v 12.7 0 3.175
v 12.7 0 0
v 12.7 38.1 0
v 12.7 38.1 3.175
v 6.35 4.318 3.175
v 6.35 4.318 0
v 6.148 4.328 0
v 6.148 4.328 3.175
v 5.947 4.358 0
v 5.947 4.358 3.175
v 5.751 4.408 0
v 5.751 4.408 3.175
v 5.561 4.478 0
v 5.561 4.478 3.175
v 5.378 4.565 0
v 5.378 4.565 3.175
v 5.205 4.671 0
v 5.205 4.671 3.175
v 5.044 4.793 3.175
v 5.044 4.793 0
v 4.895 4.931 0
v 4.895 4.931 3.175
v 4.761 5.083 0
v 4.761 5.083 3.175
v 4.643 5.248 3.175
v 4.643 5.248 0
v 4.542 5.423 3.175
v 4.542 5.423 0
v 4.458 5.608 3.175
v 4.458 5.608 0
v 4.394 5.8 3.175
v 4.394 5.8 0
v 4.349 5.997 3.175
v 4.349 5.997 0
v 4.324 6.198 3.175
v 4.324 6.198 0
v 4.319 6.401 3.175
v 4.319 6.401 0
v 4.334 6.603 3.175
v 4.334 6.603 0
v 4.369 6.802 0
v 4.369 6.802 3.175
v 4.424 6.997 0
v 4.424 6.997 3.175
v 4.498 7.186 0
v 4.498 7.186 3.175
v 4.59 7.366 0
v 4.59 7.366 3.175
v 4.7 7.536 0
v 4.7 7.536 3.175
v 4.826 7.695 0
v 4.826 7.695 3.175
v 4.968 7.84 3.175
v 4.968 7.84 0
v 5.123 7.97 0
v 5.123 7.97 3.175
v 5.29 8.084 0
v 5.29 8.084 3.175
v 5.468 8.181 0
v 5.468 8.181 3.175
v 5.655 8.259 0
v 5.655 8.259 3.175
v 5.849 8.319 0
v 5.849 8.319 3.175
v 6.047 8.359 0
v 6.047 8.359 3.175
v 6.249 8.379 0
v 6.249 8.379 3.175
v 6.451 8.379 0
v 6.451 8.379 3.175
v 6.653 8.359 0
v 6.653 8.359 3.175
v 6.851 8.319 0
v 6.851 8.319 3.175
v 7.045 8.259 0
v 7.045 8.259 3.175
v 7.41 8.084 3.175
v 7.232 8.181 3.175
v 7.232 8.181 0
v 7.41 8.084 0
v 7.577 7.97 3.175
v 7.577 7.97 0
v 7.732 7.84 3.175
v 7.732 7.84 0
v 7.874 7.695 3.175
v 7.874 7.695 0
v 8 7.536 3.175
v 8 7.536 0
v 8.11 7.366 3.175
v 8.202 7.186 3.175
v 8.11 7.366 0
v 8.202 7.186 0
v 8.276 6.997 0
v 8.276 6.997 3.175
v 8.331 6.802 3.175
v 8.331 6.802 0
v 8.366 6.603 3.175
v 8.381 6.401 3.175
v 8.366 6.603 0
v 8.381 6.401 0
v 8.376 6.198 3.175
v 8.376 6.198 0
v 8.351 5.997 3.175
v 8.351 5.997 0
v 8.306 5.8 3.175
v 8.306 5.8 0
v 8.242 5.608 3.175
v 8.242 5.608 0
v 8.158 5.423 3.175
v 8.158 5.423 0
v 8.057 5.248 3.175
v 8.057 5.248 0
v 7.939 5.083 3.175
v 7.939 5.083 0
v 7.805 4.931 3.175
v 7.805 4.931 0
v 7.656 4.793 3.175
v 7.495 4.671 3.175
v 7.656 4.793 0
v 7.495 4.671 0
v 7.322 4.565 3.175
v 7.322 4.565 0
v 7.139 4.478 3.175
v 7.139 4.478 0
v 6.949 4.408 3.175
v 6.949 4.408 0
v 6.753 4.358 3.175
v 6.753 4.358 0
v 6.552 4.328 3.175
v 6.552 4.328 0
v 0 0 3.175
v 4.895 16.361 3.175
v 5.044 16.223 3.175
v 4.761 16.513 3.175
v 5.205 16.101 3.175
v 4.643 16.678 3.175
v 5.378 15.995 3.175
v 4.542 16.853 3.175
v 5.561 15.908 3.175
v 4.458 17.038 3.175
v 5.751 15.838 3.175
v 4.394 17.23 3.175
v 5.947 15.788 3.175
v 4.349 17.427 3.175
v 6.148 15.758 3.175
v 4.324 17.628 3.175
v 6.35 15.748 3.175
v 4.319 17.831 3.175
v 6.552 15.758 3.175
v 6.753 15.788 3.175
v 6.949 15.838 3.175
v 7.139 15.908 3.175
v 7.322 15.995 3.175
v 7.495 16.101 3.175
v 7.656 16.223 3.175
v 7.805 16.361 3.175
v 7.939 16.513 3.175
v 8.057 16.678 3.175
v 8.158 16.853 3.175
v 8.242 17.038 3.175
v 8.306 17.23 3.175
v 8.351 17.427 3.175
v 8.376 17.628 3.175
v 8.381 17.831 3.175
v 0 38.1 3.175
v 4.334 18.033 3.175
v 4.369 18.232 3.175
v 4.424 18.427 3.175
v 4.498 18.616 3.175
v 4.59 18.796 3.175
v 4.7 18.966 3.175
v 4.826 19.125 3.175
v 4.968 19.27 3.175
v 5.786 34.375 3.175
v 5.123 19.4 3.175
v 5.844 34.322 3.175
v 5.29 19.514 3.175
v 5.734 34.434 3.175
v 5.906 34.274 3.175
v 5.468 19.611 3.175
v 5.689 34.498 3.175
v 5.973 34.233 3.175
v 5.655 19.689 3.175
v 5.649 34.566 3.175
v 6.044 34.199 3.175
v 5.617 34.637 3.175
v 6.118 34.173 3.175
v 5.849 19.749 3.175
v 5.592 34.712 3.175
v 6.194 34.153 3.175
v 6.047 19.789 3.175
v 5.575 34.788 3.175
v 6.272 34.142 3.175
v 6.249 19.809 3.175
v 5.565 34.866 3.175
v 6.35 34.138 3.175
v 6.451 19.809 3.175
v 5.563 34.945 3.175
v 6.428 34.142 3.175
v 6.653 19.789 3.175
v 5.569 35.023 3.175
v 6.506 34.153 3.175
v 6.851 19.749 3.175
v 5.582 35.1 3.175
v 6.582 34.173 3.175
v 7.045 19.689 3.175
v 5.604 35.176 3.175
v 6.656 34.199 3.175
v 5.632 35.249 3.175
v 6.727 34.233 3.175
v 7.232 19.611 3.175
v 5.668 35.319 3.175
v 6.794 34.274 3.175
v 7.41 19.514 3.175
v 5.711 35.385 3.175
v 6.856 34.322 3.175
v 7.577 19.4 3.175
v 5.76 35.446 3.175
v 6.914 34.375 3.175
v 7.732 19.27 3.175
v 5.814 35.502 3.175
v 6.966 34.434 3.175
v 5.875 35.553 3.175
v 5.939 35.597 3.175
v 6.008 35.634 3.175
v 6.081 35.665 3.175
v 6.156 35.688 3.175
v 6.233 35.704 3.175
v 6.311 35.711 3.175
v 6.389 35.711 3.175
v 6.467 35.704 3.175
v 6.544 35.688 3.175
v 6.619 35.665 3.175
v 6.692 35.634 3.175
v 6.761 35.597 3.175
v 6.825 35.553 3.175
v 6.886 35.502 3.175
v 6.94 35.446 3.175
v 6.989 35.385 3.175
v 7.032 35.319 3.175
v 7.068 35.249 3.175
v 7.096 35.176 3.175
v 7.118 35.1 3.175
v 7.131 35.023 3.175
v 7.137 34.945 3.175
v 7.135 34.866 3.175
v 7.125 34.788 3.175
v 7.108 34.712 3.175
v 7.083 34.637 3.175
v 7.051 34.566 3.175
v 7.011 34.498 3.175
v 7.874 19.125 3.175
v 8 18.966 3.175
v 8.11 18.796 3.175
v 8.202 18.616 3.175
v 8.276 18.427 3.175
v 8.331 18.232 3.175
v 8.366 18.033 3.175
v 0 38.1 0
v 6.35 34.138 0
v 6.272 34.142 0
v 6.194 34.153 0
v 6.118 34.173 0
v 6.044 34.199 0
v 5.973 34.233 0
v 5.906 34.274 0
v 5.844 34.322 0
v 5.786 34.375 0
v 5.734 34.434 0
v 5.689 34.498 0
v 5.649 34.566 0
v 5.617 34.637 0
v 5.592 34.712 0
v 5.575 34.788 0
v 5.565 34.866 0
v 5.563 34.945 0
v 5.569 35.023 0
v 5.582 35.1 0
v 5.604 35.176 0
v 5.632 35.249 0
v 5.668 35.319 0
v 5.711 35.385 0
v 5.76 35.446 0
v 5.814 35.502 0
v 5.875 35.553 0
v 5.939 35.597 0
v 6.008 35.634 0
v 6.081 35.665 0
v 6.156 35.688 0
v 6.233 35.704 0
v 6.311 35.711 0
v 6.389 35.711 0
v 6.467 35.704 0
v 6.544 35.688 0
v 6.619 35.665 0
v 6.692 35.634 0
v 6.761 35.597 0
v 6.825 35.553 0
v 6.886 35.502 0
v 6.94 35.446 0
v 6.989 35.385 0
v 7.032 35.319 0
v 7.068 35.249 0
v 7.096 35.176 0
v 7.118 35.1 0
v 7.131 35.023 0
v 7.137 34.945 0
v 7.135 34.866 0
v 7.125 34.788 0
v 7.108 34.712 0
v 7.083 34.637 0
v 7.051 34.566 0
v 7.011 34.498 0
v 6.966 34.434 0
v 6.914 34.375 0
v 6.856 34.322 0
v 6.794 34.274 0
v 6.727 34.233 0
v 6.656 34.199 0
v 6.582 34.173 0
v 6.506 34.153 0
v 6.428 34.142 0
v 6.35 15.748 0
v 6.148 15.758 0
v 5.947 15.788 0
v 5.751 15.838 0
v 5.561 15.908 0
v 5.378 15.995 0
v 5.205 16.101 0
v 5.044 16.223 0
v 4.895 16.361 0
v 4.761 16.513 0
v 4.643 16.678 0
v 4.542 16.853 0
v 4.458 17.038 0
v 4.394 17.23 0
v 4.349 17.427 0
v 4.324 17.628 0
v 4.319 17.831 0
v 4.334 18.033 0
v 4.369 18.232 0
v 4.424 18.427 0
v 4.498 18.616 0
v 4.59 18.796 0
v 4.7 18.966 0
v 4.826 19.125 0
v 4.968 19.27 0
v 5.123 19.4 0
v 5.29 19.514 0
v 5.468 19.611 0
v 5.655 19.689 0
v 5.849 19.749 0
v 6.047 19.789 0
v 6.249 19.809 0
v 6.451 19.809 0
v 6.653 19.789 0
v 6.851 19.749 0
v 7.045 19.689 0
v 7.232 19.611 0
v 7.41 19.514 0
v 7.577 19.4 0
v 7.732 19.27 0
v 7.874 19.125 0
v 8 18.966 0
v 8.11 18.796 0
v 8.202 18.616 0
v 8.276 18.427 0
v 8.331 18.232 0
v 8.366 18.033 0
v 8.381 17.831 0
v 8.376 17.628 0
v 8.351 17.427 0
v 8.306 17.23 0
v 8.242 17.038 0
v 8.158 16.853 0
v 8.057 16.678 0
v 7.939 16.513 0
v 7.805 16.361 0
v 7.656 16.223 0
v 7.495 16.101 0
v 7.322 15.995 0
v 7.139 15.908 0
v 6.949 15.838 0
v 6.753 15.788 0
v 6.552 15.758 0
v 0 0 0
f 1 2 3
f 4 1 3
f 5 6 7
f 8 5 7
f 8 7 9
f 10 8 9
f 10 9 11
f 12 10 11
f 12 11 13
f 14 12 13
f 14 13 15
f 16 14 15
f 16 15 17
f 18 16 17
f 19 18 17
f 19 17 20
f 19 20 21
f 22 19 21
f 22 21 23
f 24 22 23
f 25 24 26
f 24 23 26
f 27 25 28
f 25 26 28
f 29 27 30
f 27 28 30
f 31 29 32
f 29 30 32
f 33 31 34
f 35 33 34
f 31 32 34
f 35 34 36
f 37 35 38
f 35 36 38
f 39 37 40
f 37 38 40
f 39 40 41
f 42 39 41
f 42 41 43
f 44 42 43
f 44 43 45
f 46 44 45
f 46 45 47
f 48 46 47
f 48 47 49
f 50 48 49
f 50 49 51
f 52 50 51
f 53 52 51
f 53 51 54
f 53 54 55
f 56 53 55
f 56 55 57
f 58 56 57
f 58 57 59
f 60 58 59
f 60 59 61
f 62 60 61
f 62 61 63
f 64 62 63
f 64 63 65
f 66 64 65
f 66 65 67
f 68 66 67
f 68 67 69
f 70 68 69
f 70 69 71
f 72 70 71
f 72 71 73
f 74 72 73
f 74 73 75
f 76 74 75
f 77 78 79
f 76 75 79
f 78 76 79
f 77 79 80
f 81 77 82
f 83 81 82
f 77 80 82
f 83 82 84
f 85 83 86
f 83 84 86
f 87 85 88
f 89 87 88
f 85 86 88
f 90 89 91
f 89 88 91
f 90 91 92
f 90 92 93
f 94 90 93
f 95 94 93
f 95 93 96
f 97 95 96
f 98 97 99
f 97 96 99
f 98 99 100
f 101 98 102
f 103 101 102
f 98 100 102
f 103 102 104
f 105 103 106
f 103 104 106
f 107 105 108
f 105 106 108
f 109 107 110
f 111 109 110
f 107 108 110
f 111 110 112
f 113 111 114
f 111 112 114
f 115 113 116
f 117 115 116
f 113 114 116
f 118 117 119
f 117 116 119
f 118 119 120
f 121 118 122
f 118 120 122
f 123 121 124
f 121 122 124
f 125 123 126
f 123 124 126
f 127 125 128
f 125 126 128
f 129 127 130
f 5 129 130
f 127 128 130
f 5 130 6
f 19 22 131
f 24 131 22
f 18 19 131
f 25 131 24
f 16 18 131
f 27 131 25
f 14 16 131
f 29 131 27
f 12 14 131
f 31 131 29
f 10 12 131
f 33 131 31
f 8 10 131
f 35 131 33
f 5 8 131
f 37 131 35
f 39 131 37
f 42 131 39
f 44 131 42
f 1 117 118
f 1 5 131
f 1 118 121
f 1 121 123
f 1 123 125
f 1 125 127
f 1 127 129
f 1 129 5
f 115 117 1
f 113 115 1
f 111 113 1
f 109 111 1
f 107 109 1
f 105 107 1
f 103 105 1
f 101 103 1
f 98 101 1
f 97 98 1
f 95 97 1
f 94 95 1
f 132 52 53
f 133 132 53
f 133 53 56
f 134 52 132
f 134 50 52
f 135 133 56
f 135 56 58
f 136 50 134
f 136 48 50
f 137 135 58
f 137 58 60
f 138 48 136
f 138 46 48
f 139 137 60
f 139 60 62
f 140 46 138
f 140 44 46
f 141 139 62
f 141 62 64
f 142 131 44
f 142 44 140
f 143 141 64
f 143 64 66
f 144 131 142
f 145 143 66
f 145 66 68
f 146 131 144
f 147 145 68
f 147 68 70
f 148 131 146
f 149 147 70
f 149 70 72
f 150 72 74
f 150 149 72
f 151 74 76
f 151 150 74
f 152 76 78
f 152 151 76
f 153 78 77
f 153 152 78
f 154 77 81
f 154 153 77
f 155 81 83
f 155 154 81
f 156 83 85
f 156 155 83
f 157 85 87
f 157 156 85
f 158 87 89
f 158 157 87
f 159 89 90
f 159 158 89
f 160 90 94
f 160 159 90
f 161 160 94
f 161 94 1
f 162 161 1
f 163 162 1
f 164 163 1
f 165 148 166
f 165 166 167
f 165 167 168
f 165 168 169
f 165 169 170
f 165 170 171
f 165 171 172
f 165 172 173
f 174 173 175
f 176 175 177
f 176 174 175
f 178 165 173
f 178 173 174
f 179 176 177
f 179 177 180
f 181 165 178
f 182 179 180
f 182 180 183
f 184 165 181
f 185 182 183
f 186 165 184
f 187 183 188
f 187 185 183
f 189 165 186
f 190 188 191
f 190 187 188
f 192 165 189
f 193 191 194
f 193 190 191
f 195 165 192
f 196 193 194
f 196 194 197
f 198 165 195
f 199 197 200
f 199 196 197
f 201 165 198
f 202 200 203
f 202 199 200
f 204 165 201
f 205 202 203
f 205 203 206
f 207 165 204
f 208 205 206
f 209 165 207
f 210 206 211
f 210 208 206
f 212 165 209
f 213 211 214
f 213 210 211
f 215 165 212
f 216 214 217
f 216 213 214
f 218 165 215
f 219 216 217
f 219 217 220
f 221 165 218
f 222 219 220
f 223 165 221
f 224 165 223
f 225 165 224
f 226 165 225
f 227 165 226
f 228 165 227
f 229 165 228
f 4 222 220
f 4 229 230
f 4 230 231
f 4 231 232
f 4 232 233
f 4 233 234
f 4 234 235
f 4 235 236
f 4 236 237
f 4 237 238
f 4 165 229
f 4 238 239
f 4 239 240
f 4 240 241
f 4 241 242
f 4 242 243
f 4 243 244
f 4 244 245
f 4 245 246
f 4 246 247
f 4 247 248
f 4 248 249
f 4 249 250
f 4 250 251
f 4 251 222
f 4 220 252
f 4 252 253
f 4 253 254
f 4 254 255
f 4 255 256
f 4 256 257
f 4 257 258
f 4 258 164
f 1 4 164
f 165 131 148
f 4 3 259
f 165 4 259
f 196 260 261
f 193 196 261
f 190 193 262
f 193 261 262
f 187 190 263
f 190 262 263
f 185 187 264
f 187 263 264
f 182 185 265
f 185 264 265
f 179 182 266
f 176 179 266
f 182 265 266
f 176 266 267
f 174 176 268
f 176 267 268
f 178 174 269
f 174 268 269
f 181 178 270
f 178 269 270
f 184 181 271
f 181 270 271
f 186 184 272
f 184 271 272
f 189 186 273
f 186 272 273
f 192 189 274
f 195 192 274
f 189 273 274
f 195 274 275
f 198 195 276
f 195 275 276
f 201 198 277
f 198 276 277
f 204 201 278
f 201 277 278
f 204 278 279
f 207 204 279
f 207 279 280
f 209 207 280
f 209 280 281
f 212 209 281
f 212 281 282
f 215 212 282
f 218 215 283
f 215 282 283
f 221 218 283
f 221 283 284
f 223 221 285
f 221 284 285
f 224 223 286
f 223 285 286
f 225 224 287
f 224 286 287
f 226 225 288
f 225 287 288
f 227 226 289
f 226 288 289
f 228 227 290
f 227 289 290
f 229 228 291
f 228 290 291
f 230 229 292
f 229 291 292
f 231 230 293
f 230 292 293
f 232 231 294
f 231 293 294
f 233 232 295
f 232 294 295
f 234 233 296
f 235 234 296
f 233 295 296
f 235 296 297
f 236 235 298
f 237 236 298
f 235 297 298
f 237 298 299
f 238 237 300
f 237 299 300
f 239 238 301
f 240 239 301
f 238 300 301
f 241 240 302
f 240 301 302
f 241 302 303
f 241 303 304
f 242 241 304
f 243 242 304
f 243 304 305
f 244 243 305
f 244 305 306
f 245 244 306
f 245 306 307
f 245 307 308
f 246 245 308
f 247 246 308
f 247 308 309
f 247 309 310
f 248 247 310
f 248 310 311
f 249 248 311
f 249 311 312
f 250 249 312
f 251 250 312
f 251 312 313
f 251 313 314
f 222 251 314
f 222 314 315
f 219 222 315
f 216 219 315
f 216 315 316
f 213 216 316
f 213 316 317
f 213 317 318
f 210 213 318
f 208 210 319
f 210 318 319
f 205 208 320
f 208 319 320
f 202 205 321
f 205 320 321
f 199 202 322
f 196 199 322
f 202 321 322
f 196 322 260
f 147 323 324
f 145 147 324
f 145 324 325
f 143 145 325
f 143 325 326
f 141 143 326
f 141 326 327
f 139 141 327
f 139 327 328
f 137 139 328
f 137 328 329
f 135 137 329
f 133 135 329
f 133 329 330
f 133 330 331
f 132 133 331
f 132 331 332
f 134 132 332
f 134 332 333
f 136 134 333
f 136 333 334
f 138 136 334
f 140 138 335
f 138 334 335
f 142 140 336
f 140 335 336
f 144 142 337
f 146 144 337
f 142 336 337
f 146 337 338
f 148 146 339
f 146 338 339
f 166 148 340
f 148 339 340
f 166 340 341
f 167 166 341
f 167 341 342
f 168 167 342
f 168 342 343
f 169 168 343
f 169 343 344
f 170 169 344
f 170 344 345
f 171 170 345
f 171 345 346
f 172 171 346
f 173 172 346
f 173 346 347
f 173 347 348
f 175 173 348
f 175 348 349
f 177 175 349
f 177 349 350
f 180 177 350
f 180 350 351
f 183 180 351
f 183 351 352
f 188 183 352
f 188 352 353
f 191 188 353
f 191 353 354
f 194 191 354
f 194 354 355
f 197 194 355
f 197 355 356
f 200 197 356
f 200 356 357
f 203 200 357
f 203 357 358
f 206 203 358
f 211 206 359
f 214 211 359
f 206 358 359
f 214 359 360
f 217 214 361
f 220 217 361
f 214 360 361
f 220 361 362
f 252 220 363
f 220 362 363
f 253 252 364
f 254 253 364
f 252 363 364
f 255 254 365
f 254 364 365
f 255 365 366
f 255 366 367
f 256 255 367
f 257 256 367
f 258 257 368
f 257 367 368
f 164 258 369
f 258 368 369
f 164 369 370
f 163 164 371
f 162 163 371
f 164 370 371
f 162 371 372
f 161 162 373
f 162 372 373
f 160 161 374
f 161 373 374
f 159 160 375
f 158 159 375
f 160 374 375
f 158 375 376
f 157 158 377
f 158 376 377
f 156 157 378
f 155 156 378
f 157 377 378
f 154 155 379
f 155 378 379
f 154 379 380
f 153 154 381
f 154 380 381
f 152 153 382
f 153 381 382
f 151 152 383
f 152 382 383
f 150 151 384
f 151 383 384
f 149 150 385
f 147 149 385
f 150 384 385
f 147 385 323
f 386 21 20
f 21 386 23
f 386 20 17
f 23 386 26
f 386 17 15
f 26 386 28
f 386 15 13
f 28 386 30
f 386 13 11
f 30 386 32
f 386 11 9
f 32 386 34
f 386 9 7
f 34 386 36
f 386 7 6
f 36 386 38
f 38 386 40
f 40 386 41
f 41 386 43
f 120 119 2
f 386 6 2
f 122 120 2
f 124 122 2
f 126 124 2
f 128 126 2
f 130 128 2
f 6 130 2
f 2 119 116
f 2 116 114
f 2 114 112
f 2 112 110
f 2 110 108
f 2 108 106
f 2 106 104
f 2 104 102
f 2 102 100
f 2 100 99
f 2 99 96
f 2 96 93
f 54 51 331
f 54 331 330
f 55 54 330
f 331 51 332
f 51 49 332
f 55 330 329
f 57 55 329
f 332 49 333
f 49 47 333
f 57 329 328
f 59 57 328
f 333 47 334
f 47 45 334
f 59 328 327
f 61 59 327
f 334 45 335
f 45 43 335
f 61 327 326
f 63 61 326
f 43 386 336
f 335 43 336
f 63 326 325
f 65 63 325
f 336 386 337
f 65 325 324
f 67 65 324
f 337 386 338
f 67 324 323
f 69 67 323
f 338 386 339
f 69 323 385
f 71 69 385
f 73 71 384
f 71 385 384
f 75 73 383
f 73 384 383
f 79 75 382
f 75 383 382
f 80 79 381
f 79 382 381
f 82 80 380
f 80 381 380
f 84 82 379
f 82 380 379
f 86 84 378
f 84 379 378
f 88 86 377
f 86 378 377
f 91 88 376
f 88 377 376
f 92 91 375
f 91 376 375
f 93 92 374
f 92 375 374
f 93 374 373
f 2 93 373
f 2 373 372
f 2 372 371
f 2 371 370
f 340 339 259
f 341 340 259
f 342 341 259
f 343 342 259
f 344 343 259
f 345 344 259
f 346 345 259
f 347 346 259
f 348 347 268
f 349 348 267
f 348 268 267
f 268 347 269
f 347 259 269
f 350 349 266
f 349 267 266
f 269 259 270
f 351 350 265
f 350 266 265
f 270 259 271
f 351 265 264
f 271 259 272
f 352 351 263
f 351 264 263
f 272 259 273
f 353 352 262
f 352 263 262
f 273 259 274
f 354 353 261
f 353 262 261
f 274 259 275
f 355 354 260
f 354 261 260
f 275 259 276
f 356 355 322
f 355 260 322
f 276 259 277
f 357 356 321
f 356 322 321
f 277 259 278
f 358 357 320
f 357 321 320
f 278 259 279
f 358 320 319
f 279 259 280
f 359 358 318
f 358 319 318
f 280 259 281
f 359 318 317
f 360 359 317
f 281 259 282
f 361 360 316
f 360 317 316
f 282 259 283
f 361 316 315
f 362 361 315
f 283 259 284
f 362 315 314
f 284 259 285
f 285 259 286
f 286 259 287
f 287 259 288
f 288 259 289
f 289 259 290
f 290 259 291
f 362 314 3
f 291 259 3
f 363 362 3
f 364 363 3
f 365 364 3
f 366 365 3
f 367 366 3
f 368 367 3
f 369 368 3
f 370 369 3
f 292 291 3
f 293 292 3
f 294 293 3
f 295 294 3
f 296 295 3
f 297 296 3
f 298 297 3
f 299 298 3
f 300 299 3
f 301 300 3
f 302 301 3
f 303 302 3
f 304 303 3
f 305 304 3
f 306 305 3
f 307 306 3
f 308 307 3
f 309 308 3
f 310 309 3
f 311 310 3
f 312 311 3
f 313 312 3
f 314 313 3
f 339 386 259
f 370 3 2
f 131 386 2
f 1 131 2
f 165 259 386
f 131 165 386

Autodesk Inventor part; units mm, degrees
ref_plane "YZ Plane" through (0, 0, 0) normal (1, 0, 0) x (0, 1, 0)
ref_plane "XZ Plane" through (0, 0, 0) normal (0, 1, 0) x (-1, 0, 0)
ref_plane "XY Plane" through (0, 0, 0) normal (0, 0, 1) x (1, 0, 0)
sketch "Sketch1" plane through (0, 0, 0) normal (0, 0, 1) x (1, 0, 0)
  line L0 (0, 0) -> (12.7, 0)
  line L1 (12.7, 0) -> (12.7, 38.1)
  line L2 (12.7, 38.1) -> (0, 38.1)
  line L3 (0, 38.1) -> (0, 0)
  dimension "d0" = 12.7
  dimension "d1" = 38.1
extrude "Extrusion1" add sketch "Sketch1" along normal blind 3.175
sketch "Sketch2" plane through (0, 0, 3.175) normal (0, 0, 1) x (1, 0, 0)
  line L0 (0, 34.925) -> (6.35, 34.925)
  line L1 (12.7, 38.1) -> (0, 38.1) projected
  point P0 (6.35, 4.445)
  dimension "d23" = 3.175
hole "Hole1" at (6.35, 34.925, 3.175) direction (0, 0, -1) diameter 1.5748 end through all
sketch "Sketch3" plane through (0, 0, 3.175) normal (0, 0, 1) x (1, 0, 0)
  line L0 (12.7, 0) -> (12.7, 38.1) projected
  line L1 (0, 0) -> (12.7, 0) projected
  line L2 (0, 38.1) -> (0, 0) projected
  line L3 (0, 6.35) -> (6.35, 6.35)
  line L4 (6.35, 6.35) -> (6.35, 17.78)
  dimension "d24" = 6.35
  dimension "d25" = 6.35
  dimension "d26" = 11.43
hole "Hole3" at (6.35, 6.35, 3.175) at (6.35, 17.78, 3.175) direction (0, 0, -1) diameter 4.064 depth 25.4 tip angle 118
properties part number "ShoulderScrewHolderSlide"
